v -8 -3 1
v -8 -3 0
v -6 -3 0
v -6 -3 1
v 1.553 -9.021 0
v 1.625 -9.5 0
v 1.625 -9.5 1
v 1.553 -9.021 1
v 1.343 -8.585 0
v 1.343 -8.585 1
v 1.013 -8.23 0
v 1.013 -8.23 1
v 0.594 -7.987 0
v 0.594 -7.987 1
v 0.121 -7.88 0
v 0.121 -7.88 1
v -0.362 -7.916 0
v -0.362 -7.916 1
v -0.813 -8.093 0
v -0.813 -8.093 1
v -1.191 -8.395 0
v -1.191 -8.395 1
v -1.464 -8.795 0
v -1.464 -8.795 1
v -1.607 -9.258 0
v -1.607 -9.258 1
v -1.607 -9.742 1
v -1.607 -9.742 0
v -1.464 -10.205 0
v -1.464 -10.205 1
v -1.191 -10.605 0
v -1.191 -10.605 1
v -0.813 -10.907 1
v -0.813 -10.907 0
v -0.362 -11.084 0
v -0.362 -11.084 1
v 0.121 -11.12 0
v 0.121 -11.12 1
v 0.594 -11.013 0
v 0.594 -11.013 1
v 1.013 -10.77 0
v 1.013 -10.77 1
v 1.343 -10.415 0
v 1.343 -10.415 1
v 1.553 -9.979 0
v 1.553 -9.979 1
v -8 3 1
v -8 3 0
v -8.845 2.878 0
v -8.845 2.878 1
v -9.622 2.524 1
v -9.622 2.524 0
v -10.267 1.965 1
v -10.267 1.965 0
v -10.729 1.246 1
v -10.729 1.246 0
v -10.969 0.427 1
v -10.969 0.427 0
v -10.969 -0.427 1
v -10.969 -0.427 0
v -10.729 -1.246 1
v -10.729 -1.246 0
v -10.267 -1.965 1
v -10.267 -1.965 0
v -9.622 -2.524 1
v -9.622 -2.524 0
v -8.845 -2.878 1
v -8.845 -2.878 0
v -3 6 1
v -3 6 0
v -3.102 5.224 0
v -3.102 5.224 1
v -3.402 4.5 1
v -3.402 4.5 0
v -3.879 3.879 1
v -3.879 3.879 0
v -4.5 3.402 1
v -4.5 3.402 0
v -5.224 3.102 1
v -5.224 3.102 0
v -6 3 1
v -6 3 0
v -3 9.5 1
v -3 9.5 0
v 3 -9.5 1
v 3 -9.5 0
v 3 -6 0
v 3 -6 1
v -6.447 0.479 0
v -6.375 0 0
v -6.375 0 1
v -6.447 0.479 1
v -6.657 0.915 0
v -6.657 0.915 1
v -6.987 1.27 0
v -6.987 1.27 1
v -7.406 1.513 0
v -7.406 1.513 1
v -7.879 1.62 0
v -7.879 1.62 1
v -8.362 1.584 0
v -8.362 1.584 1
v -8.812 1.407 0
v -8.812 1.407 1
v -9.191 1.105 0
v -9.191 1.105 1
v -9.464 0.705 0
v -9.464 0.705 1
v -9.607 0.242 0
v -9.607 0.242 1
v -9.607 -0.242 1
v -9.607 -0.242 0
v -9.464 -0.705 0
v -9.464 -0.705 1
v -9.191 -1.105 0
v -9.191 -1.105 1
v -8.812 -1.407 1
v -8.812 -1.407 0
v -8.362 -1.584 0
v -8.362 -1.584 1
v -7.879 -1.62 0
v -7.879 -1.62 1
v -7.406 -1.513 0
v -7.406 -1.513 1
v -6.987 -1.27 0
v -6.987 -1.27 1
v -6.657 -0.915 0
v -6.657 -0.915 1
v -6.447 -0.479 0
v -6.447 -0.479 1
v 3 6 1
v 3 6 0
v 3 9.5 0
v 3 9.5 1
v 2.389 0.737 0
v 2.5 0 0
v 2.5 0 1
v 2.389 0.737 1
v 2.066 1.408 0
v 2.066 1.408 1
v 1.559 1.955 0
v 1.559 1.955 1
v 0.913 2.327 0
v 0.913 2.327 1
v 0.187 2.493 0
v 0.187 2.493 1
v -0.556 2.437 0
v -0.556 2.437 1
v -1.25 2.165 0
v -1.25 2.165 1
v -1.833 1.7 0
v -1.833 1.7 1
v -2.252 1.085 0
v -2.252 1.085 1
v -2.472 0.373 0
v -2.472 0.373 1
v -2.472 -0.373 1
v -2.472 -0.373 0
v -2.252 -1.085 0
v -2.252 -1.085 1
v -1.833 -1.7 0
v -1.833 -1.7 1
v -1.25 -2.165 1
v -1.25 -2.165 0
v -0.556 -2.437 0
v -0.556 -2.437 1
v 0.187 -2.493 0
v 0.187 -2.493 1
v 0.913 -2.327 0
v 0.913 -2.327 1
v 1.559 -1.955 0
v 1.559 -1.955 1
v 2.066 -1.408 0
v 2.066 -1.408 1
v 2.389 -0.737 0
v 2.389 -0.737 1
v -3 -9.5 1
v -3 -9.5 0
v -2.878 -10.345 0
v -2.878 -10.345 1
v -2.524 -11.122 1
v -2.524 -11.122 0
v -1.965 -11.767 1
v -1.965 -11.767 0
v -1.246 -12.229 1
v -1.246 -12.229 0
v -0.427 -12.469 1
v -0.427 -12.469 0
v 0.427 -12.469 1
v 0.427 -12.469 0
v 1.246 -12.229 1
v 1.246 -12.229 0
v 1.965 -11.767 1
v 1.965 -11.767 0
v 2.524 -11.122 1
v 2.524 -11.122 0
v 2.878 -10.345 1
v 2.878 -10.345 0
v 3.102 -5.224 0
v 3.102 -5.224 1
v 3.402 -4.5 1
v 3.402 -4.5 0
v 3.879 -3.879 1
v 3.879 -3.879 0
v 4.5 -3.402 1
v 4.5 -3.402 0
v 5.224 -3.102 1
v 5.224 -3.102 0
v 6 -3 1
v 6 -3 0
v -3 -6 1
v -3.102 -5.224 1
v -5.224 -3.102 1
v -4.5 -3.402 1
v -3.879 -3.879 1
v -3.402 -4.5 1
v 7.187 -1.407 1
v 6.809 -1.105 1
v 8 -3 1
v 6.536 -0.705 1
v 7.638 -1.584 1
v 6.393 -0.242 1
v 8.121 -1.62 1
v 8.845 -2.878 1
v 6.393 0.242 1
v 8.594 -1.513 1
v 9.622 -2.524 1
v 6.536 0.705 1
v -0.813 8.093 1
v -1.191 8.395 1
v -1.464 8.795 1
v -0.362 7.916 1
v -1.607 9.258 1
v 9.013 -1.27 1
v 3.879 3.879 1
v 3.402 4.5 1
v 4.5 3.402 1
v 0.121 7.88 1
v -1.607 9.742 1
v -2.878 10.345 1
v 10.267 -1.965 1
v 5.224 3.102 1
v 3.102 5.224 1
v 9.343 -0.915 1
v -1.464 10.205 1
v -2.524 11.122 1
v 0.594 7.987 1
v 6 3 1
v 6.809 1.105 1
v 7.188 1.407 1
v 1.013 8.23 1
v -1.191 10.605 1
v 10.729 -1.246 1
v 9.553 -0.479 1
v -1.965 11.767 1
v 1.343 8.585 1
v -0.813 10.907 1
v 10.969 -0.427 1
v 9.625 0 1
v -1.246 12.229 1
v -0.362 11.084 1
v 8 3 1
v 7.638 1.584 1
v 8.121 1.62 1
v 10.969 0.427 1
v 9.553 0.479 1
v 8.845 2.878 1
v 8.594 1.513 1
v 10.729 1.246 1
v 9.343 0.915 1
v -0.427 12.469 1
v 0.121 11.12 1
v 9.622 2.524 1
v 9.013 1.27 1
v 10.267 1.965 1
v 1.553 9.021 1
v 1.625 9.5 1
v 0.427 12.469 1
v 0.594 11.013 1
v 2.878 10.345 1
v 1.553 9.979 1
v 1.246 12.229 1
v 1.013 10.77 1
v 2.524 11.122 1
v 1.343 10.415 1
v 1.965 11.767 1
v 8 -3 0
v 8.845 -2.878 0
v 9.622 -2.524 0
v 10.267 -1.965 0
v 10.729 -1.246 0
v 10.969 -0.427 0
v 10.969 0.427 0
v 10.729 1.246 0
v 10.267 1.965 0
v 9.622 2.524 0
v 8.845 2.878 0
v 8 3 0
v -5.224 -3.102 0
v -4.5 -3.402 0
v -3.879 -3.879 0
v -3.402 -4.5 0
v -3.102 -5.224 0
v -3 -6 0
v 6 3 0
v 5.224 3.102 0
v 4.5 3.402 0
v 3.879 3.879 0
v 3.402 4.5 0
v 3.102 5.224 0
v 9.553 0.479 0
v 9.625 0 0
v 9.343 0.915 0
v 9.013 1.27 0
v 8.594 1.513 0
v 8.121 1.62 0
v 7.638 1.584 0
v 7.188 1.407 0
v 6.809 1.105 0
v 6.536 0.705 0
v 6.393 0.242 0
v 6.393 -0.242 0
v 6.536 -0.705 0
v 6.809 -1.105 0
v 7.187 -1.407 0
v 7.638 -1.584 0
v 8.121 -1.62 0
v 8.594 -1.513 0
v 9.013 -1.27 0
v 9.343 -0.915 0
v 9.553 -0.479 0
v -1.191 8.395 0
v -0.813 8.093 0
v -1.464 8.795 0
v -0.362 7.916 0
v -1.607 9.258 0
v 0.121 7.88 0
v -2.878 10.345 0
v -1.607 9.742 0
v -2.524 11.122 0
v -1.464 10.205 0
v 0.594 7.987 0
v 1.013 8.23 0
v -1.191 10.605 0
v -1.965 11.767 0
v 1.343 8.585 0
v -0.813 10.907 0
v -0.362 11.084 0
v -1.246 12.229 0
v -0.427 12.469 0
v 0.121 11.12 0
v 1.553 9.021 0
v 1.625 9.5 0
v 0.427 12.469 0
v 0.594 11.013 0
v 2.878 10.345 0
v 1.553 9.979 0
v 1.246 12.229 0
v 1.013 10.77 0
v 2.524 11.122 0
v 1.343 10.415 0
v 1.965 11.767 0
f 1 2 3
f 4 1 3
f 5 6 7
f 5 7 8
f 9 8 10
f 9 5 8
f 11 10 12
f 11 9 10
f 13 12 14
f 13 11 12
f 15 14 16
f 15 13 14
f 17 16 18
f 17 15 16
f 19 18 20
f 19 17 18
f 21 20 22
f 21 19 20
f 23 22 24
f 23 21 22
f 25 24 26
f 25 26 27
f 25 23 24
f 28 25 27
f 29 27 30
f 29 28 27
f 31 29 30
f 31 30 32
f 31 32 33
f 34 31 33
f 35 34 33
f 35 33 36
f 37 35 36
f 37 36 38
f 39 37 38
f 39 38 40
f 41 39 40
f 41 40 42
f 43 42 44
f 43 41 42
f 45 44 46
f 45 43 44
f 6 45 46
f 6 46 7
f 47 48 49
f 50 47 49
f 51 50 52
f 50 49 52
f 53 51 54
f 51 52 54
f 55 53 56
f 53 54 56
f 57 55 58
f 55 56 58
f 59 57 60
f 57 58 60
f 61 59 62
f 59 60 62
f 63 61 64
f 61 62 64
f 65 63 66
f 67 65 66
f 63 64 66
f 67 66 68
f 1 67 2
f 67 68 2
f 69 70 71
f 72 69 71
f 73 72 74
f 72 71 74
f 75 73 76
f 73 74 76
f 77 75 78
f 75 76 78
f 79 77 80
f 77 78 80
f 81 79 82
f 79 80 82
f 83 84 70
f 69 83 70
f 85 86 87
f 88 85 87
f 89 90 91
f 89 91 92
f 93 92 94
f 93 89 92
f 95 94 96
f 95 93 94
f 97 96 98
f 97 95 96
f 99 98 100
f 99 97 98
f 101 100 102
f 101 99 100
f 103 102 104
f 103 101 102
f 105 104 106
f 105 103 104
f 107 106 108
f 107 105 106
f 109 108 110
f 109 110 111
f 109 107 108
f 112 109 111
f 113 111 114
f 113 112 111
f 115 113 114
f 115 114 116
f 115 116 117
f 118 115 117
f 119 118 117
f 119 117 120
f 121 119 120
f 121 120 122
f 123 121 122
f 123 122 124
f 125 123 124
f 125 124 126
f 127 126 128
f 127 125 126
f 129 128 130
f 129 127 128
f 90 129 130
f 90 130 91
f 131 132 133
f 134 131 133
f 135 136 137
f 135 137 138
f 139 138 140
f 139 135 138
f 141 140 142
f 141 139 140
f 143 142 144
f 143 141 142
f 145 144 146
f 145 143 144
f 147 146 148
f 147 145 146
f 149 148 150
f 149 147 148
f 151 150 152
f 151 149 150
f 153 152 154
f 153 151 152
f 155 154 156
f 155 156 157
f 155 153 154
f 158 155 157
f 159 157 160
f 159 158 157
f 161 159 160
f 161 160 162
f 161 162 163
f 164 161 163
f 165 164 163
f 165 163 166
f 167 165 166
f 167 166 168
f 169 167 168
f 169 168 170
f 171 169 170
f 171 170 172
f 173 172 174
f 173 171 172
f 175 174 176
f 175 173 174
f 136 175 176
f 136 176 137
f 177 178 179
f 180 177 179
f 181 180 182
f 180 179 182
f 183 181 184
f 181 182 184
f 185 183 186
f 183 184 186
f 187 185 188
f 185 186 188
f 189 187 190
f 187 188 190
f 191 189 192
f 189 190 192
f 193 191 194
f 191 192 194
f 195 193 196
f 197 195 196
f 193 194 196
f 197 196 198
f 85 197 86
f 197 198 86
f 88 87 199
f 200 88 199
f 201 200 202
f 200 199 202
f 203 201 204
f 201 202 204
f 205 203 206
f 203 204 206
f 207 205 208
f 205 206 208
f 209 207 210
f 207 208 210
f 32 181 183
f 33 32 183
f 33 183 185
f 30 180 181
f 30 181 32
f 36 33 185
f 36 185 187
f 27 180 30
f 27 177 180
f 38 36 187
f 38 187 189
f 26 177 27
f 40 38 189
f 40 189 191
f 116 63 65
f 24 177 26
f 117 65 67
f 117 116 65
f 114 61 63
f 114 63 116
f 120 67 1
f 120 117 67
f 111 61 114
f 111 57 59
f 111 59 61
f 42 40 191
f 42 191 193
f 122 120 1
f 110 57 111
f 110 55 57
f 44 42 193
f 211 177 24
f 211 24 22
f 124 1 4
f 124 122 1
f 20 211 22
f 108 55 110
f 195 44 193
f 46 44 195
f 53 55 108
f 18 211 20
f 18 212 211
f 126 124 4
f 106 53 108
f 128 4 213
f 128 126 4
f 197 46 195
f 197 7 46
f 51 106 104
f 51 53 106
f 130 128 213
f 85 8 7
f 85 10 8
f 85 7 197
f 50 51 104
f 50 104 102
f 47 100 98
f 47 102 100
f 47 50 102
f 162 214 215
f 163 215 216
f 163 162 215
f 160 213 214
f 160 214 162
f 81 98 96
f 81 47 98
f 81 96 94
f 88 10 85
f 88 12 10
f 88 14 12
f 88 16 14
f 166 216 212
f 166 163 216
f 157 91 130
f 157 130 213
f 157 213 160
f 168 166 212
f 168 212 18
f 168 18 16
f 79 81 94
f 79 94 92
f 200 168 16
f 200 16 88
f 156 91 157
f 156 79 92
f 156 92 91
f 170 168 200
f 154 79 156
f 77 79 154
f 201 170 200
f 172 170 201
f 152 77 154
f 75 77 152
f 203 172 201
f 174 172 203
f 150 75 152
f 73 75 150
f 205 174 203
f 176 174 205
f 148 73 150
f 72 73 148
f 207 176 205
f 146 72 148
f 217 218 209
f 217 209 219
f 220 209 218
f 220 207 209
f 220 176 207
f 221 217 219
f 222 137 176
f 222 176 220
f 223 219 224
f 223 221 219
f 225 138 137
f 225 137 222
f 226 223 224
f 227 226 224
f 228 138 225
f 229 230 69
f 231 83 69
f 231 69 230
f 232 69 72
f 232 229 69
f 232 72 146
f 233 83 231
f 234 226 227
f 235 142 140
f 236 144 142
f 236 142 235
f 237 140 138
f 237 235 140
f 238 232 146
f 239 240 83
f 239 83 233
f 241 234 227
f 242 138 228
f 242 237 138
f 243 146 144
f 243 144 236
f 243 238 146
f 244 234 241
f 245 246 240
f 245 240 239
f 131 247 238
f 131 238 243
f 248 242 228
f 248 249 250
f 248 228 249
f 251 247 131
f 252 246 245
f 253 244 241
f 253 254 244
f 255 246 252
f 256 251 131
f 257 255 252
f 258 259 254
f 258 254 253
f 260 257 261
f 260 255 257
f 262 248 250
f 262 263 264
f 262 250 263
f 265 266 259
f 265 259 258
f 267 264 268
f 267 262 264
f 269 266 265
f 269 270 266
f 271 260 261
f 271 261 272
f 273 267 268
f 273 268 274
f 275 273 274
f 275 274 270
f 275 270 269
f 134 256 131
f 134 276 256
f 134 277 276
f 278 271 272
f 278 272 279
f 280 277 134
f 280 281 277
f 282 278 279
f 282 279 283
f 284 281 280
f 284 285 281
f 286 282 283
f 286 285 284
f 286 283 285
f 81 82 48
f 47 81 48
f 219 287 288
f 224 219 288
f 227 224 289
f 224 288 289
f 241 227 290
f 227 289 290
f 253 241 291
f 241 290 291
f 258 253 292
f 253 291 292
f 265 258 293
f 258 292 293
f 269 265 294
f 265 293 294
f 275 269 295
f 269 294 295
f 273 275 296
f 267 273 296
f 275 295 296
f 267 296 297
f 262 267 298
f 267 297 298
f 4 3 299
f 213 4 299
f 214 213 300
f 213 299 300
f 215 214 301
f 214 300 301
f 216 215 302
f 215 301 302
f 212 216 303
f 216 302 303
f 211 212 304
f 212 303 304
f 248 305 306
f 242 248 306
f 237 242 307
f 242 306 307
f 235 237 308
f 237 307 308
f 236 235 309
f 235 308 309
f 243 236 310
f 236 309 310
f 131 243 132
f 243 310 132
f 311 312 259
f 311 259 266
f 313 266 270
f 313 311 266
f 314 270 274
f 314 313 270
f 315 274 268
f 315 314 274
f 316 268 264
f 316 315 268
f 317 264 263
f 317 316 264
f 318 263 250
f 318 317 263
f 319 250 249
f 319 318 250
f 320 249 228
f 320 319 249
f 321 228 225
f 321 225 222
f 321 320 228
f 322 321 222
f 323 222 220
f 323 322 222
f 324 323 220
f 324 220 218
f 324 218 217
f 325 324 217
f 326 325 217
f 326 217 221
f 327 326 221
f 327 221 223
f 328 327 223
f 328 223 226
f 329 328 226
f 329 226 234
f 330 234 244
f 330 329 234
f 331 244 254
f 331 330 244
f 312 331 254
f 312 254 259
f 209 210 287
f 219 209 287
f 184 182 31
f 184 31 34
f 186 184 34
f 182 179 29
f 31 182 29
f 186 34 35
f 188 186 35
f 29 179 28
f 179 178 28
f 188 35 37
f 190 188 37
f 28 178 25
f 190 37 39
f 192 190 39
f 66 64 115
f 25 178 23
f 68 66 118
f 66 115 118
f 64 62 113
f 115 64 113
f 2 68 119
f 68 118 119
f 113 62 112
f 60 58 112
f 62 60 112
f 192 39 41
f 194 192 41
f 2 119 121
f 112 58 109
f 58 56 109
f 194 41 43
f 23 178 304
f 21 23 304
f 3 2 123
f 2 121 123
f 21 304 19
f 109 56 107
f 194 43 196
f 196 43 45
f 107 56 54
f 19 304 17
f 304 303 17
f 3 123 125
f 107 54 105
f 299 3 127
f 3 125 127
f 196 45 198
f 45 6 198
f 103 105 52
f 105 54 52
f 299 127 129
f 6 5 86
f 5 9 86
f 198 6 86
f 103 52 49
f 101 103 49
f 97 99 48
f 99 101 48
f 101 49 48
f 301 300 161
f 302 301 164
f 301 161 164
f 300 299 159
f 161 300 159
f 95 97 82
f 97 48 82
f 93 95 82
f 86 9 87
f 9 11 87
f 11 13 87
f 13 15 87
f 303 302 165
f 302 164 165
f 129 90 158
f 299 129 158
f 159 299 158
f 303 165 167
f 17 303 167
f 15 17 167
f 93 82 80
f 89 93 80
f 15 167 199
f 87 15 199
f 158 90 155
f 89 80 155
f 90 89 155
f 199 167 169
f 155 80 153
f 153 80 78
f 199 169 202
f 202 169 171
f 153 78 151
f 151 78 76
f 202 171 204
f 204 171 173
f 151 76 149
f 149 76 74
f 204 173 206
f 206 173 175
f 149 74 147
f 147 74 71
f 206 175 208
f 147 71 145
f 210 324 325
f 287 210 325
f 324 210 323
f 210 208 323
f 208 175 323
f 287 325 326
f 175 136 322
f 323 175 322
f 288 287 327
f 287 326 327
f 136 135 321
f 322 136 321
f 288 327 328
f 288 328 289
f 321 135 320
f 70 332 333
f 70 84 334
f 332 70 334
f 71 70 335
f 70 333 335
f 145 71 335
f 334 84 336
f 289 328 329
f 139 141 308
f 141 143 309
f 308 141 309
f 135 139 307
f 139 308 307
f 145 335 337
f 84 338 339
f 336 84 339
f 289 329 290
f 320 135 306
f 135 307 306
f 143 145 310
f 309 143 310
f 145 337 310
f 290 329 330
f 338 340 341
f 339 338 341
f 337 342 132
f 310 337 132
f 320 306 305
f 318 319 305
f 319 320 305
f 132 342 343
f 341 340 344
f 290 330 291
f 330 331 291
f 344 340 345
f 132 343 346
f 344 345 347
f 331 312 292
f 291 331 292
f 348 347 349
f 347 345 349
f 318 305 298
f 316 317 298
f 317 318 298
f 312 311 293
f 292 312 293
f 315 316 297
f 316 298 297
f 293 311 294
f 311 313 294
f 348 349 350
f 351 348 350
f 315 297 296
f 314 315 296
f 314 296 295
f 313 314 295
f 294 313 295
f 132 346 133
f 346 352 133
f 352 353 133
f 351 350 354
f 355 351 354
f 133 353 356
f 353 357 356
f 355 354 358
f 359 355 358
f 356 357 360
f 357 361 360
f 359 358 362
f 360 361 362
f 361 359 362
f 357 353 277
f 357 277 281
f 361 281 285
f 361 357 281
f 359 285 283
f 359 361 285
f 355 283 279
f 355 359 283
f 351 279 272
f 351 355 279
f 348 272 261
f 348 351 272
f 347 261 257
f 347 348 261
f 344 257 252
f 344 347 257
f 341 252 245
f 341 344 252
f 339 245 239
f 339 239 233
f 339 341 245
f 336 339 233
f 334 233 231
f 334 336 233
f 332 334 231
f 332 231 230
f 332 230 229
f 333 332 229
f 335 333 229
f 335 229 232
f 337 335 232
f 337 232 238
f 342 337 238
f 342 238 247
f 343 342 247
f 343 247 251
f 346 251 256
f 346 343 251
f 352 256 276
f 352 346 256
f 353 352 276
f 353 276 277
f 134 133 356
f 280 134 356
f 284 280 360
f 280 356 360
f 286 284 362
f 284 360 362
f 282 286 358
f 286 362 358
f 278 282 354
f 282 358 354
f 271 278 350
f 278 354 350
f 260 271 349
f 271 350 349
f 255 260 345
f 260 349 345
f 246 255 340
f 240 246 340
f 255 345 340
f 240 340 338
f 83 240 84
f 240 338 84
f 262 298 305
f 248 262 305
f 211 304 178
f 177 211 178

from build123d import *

# Parameters (mm, degrees)
F0_R     = 1.625
F0_R_2   = 2.5
F1_DEPTH = 1


with BuildPart() as f1:
    # F0 (on Top) → F1 (new body)
    with BuildSketch(Plane.XY):
        with BuildLine():
            ThreePointArc((3, 9.5), (0, 12.5), (-3, 9.5))
            Line((-3, 9.5), (-3, 6))
            ThreePointArc((-3, 6), (-3.87868, 3.87868), (-6, 3))
            Line((-6, 3), (-8, 3))
            ThreePointArc((-8, 3), (-11, 0), (-8, -3))
            Line((-8, -3), (-6, -3))
            ThreePointArc((-6, -3), (-3.87868, -3.87868), (-3, -6))
            Line((-3, -6), (-3, -9.5))
            ThreePointArc((-3, -9.5), (0, -12.5), (3, -9.5))
            Line((3, -9.5), (3, -6))
            ThreePointArc((3, -6), (3.87868, -3.87868), (6, -3))
            Line((6, -3), (8, -3))
            ThreePointArc((8, -3), (11, 0), (8, 3))
            Line((8, 3), (6, 3))
            ThreePointArc((6, 3), (3.87868, 3.87868), (3, 6))
            Line((3, 6), (3, 9.5))
        make_face()
        with Locations((0, -9.5)):
            Circle(F0_R, mode=Mode.SUBTRACT)
        with Locations((-8, 0)):
            Circle(F0_R, mode=Mode.SUBTRACT)
        Circle(F0_R_2, mode=Mode.SUBTRACT)
        with Locations((8, 0)):
            Circle(F0_R, mode=Mode.SUBTRACT)
        with Locations((0, 9.5)):
            Circle(F0_R, mode=Mode.SUBTRACT)
    extrude(amount=F1_DEPTH)


solid = f1.part
